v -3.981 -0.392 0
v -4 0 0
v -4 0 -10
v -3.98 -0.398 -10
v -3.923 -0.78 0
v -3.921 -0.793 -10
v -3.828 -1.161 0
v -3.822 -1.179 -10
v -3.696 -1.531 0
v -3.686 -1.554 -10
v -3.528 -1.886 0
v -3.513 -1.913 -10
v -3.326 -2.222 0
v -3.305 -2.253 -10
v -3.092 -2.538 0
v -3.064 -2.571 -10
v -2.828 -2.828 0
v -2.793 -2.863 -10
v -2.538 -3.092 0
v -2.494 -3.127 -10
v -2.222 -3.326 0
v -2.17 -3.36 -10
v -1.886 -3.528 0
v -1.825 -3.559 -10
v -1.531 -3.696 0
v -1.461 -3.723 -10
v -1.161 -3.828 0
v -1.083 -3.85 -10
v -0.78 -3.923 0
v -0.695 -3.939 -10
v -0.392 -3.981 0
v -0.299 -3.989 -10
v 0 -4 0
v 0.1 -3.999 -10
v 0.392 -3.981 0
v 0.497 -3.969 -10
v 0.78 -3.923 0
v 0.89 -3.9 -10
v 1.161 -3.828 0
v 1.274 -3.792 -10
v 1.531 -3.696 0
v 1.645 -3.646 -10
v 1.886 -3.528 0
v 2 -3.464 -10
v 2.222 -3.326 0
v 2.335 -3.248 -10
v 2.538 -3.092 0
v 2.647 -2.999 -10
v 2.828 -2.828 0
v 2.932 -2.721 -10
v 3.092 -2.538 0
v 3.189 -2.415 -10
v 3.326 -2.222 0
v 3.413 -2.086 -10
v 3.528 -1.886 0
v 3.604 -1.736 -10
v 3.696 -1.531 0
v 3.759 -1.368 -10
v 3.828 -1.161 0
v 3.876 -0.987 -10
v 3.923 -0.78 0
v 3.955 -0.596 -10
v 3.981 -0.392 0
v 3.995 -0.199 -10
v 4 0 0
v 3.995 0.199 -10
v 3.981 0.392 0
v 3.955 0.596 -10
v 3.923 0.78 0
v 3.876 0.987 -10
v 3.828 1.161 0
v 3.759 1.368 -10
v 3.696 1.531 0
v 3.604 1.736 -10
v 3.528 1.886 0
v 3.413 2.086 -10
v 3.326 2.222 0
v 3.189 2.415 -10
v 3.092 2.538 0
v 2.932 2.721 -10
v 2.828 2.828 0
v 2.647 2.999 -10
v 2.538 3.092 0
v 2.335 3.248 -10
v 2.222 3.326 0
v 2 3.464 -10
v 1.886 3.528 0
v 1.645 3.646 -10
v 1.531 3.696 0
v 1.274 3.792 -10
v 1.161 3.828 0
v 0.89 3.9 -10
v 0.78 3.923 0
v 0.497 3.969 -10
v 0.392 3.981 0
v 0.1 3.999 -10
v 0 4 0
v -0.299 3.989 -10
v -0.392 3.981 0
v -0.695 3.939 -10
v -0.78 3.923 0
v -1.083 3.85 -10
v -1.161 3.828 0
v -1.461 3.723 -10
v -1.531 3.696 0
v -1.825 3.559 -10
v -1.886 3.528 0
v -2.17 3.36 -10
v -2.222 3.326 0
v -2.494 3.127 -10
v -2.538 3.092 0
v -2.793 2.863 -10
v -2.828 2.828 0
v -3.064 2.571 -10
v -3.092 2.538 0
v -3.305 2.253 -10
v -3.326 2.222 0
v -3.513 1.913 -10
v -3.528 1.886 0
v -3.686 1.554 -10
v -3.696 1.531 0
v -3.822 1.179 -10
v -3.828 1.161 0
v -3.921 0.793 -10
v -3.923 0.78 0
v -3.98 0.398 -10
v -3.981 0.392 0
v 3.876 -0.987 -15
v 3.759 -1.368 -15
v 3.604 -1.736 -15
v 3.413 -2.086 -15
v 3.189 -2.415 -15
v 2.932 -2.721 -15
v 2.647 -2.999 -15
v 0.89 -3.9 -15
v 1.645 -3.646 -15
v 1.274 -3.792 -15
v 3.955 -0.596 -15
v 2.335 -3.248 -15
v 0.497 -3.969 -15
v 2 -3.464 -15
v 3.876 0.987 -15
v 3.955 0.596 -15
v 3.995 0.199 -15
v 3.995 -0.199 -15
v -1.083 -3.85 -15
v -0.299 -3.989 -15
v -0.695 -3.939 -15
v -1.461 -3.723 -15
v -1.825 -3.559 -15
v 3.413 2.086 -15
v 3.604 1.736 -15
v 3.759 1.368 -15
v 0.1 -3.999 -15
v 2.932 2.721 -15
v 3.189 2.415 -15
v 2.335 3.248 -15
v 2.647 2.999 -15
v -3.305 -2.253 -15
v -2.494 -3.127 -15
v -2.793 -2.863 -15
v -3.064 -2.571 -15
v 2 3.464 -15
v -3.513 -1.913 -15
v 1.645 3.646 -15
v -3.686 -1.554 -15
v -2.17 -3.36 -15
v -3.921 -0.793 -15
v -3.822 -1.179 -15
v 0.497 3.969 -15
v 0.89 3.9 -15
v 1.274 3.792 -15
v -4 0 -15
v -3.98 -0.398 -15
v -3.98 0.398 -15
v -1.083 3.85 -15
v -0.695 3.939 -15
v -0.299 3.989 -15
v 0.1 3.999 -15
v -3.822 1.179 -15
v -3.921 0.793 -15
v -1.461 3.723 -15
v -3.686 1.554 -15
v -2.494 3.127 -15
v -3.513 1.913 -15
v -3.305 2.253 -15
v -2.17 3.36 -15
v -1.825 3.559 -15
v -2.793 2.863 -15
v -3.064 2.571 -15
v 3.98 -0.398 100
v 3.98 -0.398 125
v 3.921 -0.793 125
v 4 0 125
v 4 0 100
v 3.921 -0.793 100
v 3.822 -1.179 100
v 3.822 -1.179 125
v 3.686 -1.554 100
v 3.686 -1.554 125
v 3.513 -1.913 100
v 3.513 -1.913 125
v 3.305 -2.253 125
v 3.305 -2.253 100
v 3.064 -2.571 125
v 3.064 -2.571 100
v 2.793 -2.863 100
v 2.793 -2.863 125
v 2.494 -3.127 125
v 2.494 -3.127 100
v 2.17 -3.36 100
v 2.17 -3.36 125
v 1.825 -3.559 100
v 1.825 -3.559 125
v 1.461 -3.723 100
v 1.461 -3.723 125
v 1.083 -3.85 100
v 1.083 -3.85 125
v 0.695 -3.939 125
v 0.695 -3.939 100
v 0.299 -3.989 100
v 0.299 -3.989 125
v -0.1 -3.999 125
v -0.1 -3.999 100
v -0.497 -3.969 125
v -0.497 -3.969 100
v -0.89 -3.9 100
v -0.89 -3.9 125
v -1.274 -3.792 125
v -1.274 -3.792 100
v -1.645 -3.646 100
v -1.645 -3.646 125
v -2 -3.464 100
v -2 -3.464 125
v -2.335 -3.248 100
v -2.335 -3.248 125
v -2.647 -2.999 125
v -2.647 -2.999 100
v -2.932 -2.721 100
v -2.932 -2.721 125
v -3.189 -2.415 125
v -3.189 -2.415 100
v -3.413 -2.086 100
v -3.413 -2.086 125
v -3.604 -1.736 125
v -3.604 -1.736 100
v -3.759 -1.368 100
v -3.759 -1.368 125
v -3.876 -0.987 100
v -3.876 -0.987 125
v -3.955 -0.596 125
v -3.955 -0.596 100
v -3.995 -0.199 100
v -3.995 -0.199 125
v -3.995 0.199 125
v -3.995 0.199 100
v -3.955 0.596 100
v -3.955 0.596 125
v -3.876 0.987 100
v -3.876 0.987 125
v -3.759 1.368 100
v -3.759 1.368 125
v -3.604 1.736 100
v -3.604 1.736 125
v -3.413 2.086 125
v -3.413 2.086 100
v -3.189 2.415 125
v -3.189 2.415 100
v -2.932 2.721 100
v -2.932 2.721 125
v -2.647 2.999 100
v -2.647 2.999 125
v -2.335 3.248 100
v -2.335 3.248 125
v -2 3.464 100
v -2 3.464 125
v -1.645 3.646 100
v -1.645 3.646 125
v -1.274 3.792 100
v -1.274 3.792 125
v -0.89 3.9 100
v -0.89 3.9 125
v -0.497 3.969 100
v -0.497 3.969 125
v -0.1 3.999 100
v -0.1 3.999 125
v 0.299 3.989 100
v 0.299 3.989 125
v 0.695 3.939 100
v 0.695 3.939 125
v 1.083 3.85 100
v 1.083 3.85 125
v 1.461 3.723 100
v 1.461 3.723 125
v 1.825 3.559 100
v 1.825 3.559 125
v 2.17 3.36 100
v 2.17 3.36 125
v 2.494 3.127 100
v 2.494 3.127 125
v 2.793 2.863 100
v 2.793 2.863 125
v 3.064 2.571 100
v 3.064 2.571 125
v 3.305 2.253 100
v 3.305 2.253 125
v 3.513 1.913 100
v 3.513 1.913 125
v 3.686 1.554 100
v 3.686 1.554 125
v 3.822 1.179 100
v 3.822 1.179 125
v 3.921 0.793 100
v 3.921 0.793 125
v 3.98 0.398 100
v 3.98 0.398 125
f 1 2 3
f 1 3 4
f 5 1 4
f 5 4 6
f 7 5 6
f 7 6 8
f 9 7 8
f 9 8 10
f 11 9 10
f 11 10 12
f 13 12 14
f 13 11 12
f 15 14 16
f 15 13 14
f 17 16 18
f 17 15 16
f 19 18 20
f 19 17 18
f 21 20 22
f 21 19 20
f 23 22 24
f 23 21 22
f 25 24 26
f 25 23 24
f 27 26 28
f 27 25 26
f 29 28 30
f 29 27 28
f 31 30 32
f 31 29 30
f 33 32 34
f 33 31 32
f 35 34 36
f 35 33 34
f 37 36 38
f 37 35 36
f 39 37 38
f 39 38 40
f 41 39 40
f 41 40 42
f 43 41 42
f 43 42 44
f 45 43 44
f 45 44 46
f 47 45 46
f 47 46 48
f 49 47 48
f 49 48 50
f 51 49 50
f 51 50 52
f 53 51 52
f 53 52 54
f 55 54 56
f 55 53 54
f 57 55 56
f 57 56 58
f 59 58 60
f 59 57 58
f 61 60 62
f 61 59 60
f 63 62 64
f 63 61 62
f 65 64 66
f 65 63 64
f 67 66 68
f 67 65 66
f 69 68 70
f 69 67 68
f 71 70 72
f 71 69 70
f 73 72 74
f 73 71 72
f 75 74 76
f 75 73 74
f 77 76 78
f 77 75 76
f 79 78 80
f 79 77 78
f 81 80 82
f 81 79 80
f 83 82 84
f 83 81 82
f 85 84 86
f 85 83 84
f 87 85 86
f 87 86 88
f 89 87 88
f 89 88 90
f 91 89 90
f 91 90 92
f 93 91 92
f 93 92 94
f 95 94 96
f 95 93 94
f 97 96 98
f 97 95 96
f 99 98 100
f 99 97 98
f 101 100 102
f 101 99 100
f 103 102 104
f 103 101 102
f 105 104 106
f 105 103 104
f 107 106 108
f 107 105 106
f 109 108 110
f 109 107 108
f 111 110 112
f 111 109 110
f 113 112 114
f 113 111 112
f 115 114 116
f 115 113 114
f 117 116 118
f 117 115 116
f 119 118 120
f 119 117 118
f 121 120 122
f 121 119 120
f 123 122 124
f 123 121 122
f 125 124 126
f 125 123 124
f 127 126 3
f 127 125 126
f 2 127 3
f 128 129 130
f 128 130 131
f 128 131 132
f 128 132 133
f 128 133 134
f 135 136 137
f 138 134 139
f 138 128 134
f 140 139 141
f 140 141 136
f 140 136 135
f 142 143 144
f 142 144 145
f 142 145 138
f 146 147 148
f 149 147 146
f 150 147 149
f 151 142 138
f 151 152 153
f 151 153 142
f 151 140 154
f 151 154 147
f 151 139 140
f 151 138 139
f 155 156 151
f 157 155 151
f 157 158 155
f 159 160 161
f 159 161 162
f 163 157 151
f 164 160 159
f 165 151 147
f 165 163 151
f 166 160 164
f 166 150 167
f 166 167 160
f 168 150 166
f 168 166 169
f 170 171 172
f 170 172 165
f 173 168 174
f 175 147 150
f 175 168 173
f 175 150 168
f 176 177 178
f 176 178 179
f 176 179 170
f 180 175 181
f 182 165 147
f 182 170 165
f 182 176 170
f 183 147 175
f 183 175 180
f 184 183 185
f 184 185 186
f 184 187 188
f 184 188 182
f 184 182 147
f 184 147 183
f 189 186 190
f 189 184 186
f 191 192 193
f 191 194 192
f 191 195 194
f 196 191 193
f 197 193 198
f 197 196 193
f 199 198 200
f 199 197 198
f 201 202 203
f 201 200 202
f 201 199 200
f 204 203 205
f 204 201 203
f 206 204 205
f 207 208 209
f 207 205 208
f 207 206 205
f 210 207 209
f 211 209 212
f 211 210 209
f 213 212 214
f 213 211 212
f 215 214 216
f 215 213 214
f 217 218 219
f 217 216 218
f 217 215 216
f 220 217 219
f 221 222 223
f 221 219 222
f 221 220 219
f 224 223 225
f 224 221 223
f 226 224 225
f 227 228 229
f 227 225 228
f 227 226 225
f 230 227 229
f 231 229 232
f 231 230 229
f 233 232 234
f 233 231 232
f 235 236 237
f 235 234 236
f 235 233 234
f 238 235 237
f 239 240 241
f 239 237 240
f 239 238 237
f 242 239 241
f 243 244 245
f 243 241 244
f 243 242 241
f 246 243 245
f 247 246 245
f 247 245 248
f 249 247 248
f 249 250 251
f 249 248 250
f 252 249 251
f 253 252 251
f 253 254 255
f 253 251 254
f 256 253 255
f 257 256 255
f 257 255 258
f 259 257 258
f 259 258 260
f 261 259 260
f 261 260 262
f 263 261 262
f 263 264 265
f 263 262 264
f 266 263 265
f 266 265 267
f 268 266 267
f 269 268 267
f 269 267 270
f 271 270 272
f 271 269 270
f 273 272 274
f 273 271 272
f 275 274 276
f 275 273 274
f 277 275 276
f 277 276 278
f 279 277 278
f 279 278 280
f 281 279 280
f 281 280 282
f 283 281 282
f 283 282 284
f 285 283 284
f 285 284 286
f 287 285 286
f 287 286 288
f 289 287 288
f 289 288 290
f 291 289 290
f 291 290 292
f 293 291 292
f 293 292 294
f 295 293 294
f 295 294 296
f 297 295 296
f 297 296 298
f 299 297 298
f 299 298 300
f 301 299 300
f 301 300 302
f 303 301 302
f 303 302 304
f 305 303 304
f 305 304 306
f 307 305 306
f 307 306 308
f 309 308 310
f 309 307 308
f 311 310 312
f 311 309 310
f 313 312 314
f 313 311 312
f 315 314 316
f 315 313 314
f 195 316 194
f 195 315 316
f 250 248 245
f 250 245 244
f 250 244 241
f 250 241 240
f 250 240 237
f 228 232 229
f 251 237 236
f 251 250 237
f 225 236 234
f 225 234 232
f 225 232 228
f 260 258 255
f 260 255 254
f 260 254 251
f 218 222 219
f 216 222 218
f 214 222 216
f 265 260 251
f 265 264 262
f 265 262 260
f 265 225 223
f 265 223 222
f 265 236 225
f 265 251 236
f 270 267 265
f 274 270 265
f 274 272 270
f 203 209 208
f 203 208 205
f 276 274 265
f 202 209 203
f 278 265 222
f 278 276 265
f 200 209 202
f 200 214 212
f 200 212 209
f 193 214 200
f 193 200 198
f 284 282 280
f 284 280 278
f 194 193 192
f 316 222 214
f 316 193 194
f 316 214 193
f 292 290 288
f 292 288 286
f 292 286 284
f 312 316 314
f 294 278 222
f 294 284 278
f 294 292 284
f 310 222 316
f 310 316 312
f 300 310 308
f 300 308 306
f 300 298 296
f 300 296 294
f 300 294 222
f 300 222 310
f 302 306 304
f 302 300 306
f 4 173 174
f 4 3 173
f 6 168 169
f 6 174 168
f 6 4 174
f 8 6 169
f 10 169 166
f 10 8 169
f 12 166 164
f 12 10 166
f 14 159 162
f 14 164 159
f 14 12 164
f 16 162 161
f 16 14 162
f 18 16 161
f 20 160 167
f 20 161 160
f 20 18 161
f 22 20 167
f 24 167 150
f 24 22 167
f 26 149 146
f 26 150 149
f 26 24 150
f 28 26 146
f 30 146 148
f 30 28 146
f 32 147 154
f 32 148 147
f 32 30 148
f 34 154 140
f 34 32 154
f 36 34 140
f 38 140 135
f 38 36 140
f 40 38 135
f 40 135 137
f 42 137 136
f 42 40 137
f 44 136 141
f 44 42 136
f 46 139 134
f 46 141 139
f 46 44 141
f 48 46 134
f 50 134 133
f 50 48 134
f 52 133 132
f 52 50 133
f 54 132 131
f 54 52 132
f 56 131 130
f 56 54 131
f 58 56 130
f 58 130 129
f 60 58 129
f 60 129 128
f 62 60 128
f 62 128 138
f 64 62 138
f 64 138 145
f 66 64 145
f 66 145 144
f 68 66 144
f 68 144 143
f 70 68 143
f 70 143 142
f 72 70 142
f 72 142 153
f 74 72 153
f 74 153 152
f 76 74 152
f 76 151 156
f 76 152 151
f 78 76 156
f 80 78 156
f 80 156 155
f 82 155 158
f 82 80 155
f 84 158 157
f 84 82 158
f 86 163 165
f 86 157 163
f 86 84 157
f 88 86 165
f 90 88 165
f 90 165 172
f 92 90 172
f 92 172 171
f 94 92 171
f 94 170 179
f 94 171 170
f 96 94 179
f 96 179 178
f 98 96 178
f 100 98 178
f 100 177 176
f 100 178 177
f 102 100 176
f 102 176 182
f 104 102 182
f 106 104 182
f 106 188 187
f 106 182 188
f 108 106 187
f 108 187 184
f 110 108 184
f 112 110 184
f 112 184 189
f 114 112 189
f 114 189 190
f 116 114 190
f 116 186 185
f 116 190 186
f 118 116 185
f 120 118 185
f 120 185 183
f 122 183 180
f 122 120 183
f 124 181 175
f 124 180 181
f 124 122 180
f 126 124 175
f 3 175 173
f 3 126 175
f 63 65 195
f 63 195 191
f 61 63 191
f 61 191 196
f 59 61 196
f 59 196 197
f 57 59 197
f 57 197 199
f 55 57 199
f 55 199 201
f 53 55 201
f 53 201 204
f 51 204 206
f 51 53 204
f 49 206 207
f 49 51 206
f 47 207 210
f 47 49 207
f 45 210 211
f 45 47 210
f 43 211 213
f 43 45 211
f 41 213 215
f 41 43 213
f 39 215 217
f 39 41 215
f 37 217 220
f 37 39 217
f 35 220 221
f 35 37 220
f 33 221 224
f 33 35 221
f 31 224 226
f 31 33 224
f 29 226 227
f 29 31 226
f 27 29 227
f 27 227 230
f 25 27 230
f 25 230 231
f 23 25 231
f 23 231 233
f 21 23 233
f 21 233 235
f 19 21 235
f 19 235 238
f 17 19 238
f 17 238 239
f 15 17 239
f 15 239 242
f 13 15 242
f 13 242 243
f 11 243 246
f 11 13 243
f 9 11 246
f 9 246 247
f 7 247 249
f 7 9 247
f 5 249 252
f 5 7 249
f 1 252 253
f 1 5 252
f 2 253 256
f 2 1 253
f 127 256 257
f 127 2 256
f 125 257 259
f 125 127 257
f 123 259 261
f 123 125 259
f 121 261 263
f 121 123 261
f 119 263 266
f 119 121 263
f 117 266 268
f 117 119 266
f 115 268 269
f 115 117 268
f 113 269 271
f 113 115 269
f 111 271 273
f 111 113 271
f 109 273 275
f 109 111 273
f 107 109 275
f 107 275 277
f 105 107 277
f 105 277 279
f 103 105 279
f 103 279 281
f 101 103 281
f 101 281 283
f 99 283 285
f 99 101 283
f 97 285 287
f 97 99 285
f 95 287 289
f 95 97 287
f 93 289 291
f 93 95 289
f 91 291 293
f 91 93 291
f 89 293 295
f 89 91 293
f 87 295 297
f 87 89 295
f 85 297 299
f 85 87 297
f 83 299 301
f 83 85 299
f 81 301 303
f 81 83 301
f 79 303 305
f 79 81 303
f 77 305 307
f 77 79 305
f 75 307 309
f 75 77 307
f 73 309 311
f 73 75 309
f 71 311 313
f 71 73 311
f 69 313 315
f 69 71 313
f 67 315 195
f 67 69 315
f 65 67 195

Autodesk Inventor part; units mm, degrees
ref_plane "YZ Plane" through (0, 0, 0) normal (1, 0, 0) x (0, 1, 0)
ref_plane "XZ Plane" through (0, 0, 0) normal (0, 1, 0) x (-1, 0, 0)
ref_plane "XY Plane" through (0, 0, 0) normal (0, 0, 1) x (1, 0, 0)
sketch "スケッチ1" plane through (0, 0, 0) normal (0, 0, 1) x (1, 0, 0)
  circle A0 centre (0, 0) radius 4
  dimension "d0" = 8
extrude "押し出し1" add sketch "スケッチ1" along normal blind 100
sketch "スケッチ2" plane through (0, 0, 0) normal (0, 0, -1) x (-1, 0, 0)
  circle A0 centre (0, 0) radius 4
extrude "押し出し2" add sketch "スケッチ2" along normal blind 10
sketch "スケッチ3" plane through (0, 0, 100) normal (0, 0, 1) x (1, 0, 0)
  circle A0 centre (0, 0) radius 4 projected
  circle A1 centre (0, 0) radius 4
  dimension "d5" = 8
extrude "押し出し3" add sketch "スケッチ3" along normal blind 25
sketch "スケッチ4" plane through (0, 0, -10) normal (0, 0, -1) x (-1, 0, 0)
  circle A0 centre (0, 0) radius 4
extrude "押し出し4" add sketch "スケッチ4" along normal blind 5
properties part number "8mm軸_2"
